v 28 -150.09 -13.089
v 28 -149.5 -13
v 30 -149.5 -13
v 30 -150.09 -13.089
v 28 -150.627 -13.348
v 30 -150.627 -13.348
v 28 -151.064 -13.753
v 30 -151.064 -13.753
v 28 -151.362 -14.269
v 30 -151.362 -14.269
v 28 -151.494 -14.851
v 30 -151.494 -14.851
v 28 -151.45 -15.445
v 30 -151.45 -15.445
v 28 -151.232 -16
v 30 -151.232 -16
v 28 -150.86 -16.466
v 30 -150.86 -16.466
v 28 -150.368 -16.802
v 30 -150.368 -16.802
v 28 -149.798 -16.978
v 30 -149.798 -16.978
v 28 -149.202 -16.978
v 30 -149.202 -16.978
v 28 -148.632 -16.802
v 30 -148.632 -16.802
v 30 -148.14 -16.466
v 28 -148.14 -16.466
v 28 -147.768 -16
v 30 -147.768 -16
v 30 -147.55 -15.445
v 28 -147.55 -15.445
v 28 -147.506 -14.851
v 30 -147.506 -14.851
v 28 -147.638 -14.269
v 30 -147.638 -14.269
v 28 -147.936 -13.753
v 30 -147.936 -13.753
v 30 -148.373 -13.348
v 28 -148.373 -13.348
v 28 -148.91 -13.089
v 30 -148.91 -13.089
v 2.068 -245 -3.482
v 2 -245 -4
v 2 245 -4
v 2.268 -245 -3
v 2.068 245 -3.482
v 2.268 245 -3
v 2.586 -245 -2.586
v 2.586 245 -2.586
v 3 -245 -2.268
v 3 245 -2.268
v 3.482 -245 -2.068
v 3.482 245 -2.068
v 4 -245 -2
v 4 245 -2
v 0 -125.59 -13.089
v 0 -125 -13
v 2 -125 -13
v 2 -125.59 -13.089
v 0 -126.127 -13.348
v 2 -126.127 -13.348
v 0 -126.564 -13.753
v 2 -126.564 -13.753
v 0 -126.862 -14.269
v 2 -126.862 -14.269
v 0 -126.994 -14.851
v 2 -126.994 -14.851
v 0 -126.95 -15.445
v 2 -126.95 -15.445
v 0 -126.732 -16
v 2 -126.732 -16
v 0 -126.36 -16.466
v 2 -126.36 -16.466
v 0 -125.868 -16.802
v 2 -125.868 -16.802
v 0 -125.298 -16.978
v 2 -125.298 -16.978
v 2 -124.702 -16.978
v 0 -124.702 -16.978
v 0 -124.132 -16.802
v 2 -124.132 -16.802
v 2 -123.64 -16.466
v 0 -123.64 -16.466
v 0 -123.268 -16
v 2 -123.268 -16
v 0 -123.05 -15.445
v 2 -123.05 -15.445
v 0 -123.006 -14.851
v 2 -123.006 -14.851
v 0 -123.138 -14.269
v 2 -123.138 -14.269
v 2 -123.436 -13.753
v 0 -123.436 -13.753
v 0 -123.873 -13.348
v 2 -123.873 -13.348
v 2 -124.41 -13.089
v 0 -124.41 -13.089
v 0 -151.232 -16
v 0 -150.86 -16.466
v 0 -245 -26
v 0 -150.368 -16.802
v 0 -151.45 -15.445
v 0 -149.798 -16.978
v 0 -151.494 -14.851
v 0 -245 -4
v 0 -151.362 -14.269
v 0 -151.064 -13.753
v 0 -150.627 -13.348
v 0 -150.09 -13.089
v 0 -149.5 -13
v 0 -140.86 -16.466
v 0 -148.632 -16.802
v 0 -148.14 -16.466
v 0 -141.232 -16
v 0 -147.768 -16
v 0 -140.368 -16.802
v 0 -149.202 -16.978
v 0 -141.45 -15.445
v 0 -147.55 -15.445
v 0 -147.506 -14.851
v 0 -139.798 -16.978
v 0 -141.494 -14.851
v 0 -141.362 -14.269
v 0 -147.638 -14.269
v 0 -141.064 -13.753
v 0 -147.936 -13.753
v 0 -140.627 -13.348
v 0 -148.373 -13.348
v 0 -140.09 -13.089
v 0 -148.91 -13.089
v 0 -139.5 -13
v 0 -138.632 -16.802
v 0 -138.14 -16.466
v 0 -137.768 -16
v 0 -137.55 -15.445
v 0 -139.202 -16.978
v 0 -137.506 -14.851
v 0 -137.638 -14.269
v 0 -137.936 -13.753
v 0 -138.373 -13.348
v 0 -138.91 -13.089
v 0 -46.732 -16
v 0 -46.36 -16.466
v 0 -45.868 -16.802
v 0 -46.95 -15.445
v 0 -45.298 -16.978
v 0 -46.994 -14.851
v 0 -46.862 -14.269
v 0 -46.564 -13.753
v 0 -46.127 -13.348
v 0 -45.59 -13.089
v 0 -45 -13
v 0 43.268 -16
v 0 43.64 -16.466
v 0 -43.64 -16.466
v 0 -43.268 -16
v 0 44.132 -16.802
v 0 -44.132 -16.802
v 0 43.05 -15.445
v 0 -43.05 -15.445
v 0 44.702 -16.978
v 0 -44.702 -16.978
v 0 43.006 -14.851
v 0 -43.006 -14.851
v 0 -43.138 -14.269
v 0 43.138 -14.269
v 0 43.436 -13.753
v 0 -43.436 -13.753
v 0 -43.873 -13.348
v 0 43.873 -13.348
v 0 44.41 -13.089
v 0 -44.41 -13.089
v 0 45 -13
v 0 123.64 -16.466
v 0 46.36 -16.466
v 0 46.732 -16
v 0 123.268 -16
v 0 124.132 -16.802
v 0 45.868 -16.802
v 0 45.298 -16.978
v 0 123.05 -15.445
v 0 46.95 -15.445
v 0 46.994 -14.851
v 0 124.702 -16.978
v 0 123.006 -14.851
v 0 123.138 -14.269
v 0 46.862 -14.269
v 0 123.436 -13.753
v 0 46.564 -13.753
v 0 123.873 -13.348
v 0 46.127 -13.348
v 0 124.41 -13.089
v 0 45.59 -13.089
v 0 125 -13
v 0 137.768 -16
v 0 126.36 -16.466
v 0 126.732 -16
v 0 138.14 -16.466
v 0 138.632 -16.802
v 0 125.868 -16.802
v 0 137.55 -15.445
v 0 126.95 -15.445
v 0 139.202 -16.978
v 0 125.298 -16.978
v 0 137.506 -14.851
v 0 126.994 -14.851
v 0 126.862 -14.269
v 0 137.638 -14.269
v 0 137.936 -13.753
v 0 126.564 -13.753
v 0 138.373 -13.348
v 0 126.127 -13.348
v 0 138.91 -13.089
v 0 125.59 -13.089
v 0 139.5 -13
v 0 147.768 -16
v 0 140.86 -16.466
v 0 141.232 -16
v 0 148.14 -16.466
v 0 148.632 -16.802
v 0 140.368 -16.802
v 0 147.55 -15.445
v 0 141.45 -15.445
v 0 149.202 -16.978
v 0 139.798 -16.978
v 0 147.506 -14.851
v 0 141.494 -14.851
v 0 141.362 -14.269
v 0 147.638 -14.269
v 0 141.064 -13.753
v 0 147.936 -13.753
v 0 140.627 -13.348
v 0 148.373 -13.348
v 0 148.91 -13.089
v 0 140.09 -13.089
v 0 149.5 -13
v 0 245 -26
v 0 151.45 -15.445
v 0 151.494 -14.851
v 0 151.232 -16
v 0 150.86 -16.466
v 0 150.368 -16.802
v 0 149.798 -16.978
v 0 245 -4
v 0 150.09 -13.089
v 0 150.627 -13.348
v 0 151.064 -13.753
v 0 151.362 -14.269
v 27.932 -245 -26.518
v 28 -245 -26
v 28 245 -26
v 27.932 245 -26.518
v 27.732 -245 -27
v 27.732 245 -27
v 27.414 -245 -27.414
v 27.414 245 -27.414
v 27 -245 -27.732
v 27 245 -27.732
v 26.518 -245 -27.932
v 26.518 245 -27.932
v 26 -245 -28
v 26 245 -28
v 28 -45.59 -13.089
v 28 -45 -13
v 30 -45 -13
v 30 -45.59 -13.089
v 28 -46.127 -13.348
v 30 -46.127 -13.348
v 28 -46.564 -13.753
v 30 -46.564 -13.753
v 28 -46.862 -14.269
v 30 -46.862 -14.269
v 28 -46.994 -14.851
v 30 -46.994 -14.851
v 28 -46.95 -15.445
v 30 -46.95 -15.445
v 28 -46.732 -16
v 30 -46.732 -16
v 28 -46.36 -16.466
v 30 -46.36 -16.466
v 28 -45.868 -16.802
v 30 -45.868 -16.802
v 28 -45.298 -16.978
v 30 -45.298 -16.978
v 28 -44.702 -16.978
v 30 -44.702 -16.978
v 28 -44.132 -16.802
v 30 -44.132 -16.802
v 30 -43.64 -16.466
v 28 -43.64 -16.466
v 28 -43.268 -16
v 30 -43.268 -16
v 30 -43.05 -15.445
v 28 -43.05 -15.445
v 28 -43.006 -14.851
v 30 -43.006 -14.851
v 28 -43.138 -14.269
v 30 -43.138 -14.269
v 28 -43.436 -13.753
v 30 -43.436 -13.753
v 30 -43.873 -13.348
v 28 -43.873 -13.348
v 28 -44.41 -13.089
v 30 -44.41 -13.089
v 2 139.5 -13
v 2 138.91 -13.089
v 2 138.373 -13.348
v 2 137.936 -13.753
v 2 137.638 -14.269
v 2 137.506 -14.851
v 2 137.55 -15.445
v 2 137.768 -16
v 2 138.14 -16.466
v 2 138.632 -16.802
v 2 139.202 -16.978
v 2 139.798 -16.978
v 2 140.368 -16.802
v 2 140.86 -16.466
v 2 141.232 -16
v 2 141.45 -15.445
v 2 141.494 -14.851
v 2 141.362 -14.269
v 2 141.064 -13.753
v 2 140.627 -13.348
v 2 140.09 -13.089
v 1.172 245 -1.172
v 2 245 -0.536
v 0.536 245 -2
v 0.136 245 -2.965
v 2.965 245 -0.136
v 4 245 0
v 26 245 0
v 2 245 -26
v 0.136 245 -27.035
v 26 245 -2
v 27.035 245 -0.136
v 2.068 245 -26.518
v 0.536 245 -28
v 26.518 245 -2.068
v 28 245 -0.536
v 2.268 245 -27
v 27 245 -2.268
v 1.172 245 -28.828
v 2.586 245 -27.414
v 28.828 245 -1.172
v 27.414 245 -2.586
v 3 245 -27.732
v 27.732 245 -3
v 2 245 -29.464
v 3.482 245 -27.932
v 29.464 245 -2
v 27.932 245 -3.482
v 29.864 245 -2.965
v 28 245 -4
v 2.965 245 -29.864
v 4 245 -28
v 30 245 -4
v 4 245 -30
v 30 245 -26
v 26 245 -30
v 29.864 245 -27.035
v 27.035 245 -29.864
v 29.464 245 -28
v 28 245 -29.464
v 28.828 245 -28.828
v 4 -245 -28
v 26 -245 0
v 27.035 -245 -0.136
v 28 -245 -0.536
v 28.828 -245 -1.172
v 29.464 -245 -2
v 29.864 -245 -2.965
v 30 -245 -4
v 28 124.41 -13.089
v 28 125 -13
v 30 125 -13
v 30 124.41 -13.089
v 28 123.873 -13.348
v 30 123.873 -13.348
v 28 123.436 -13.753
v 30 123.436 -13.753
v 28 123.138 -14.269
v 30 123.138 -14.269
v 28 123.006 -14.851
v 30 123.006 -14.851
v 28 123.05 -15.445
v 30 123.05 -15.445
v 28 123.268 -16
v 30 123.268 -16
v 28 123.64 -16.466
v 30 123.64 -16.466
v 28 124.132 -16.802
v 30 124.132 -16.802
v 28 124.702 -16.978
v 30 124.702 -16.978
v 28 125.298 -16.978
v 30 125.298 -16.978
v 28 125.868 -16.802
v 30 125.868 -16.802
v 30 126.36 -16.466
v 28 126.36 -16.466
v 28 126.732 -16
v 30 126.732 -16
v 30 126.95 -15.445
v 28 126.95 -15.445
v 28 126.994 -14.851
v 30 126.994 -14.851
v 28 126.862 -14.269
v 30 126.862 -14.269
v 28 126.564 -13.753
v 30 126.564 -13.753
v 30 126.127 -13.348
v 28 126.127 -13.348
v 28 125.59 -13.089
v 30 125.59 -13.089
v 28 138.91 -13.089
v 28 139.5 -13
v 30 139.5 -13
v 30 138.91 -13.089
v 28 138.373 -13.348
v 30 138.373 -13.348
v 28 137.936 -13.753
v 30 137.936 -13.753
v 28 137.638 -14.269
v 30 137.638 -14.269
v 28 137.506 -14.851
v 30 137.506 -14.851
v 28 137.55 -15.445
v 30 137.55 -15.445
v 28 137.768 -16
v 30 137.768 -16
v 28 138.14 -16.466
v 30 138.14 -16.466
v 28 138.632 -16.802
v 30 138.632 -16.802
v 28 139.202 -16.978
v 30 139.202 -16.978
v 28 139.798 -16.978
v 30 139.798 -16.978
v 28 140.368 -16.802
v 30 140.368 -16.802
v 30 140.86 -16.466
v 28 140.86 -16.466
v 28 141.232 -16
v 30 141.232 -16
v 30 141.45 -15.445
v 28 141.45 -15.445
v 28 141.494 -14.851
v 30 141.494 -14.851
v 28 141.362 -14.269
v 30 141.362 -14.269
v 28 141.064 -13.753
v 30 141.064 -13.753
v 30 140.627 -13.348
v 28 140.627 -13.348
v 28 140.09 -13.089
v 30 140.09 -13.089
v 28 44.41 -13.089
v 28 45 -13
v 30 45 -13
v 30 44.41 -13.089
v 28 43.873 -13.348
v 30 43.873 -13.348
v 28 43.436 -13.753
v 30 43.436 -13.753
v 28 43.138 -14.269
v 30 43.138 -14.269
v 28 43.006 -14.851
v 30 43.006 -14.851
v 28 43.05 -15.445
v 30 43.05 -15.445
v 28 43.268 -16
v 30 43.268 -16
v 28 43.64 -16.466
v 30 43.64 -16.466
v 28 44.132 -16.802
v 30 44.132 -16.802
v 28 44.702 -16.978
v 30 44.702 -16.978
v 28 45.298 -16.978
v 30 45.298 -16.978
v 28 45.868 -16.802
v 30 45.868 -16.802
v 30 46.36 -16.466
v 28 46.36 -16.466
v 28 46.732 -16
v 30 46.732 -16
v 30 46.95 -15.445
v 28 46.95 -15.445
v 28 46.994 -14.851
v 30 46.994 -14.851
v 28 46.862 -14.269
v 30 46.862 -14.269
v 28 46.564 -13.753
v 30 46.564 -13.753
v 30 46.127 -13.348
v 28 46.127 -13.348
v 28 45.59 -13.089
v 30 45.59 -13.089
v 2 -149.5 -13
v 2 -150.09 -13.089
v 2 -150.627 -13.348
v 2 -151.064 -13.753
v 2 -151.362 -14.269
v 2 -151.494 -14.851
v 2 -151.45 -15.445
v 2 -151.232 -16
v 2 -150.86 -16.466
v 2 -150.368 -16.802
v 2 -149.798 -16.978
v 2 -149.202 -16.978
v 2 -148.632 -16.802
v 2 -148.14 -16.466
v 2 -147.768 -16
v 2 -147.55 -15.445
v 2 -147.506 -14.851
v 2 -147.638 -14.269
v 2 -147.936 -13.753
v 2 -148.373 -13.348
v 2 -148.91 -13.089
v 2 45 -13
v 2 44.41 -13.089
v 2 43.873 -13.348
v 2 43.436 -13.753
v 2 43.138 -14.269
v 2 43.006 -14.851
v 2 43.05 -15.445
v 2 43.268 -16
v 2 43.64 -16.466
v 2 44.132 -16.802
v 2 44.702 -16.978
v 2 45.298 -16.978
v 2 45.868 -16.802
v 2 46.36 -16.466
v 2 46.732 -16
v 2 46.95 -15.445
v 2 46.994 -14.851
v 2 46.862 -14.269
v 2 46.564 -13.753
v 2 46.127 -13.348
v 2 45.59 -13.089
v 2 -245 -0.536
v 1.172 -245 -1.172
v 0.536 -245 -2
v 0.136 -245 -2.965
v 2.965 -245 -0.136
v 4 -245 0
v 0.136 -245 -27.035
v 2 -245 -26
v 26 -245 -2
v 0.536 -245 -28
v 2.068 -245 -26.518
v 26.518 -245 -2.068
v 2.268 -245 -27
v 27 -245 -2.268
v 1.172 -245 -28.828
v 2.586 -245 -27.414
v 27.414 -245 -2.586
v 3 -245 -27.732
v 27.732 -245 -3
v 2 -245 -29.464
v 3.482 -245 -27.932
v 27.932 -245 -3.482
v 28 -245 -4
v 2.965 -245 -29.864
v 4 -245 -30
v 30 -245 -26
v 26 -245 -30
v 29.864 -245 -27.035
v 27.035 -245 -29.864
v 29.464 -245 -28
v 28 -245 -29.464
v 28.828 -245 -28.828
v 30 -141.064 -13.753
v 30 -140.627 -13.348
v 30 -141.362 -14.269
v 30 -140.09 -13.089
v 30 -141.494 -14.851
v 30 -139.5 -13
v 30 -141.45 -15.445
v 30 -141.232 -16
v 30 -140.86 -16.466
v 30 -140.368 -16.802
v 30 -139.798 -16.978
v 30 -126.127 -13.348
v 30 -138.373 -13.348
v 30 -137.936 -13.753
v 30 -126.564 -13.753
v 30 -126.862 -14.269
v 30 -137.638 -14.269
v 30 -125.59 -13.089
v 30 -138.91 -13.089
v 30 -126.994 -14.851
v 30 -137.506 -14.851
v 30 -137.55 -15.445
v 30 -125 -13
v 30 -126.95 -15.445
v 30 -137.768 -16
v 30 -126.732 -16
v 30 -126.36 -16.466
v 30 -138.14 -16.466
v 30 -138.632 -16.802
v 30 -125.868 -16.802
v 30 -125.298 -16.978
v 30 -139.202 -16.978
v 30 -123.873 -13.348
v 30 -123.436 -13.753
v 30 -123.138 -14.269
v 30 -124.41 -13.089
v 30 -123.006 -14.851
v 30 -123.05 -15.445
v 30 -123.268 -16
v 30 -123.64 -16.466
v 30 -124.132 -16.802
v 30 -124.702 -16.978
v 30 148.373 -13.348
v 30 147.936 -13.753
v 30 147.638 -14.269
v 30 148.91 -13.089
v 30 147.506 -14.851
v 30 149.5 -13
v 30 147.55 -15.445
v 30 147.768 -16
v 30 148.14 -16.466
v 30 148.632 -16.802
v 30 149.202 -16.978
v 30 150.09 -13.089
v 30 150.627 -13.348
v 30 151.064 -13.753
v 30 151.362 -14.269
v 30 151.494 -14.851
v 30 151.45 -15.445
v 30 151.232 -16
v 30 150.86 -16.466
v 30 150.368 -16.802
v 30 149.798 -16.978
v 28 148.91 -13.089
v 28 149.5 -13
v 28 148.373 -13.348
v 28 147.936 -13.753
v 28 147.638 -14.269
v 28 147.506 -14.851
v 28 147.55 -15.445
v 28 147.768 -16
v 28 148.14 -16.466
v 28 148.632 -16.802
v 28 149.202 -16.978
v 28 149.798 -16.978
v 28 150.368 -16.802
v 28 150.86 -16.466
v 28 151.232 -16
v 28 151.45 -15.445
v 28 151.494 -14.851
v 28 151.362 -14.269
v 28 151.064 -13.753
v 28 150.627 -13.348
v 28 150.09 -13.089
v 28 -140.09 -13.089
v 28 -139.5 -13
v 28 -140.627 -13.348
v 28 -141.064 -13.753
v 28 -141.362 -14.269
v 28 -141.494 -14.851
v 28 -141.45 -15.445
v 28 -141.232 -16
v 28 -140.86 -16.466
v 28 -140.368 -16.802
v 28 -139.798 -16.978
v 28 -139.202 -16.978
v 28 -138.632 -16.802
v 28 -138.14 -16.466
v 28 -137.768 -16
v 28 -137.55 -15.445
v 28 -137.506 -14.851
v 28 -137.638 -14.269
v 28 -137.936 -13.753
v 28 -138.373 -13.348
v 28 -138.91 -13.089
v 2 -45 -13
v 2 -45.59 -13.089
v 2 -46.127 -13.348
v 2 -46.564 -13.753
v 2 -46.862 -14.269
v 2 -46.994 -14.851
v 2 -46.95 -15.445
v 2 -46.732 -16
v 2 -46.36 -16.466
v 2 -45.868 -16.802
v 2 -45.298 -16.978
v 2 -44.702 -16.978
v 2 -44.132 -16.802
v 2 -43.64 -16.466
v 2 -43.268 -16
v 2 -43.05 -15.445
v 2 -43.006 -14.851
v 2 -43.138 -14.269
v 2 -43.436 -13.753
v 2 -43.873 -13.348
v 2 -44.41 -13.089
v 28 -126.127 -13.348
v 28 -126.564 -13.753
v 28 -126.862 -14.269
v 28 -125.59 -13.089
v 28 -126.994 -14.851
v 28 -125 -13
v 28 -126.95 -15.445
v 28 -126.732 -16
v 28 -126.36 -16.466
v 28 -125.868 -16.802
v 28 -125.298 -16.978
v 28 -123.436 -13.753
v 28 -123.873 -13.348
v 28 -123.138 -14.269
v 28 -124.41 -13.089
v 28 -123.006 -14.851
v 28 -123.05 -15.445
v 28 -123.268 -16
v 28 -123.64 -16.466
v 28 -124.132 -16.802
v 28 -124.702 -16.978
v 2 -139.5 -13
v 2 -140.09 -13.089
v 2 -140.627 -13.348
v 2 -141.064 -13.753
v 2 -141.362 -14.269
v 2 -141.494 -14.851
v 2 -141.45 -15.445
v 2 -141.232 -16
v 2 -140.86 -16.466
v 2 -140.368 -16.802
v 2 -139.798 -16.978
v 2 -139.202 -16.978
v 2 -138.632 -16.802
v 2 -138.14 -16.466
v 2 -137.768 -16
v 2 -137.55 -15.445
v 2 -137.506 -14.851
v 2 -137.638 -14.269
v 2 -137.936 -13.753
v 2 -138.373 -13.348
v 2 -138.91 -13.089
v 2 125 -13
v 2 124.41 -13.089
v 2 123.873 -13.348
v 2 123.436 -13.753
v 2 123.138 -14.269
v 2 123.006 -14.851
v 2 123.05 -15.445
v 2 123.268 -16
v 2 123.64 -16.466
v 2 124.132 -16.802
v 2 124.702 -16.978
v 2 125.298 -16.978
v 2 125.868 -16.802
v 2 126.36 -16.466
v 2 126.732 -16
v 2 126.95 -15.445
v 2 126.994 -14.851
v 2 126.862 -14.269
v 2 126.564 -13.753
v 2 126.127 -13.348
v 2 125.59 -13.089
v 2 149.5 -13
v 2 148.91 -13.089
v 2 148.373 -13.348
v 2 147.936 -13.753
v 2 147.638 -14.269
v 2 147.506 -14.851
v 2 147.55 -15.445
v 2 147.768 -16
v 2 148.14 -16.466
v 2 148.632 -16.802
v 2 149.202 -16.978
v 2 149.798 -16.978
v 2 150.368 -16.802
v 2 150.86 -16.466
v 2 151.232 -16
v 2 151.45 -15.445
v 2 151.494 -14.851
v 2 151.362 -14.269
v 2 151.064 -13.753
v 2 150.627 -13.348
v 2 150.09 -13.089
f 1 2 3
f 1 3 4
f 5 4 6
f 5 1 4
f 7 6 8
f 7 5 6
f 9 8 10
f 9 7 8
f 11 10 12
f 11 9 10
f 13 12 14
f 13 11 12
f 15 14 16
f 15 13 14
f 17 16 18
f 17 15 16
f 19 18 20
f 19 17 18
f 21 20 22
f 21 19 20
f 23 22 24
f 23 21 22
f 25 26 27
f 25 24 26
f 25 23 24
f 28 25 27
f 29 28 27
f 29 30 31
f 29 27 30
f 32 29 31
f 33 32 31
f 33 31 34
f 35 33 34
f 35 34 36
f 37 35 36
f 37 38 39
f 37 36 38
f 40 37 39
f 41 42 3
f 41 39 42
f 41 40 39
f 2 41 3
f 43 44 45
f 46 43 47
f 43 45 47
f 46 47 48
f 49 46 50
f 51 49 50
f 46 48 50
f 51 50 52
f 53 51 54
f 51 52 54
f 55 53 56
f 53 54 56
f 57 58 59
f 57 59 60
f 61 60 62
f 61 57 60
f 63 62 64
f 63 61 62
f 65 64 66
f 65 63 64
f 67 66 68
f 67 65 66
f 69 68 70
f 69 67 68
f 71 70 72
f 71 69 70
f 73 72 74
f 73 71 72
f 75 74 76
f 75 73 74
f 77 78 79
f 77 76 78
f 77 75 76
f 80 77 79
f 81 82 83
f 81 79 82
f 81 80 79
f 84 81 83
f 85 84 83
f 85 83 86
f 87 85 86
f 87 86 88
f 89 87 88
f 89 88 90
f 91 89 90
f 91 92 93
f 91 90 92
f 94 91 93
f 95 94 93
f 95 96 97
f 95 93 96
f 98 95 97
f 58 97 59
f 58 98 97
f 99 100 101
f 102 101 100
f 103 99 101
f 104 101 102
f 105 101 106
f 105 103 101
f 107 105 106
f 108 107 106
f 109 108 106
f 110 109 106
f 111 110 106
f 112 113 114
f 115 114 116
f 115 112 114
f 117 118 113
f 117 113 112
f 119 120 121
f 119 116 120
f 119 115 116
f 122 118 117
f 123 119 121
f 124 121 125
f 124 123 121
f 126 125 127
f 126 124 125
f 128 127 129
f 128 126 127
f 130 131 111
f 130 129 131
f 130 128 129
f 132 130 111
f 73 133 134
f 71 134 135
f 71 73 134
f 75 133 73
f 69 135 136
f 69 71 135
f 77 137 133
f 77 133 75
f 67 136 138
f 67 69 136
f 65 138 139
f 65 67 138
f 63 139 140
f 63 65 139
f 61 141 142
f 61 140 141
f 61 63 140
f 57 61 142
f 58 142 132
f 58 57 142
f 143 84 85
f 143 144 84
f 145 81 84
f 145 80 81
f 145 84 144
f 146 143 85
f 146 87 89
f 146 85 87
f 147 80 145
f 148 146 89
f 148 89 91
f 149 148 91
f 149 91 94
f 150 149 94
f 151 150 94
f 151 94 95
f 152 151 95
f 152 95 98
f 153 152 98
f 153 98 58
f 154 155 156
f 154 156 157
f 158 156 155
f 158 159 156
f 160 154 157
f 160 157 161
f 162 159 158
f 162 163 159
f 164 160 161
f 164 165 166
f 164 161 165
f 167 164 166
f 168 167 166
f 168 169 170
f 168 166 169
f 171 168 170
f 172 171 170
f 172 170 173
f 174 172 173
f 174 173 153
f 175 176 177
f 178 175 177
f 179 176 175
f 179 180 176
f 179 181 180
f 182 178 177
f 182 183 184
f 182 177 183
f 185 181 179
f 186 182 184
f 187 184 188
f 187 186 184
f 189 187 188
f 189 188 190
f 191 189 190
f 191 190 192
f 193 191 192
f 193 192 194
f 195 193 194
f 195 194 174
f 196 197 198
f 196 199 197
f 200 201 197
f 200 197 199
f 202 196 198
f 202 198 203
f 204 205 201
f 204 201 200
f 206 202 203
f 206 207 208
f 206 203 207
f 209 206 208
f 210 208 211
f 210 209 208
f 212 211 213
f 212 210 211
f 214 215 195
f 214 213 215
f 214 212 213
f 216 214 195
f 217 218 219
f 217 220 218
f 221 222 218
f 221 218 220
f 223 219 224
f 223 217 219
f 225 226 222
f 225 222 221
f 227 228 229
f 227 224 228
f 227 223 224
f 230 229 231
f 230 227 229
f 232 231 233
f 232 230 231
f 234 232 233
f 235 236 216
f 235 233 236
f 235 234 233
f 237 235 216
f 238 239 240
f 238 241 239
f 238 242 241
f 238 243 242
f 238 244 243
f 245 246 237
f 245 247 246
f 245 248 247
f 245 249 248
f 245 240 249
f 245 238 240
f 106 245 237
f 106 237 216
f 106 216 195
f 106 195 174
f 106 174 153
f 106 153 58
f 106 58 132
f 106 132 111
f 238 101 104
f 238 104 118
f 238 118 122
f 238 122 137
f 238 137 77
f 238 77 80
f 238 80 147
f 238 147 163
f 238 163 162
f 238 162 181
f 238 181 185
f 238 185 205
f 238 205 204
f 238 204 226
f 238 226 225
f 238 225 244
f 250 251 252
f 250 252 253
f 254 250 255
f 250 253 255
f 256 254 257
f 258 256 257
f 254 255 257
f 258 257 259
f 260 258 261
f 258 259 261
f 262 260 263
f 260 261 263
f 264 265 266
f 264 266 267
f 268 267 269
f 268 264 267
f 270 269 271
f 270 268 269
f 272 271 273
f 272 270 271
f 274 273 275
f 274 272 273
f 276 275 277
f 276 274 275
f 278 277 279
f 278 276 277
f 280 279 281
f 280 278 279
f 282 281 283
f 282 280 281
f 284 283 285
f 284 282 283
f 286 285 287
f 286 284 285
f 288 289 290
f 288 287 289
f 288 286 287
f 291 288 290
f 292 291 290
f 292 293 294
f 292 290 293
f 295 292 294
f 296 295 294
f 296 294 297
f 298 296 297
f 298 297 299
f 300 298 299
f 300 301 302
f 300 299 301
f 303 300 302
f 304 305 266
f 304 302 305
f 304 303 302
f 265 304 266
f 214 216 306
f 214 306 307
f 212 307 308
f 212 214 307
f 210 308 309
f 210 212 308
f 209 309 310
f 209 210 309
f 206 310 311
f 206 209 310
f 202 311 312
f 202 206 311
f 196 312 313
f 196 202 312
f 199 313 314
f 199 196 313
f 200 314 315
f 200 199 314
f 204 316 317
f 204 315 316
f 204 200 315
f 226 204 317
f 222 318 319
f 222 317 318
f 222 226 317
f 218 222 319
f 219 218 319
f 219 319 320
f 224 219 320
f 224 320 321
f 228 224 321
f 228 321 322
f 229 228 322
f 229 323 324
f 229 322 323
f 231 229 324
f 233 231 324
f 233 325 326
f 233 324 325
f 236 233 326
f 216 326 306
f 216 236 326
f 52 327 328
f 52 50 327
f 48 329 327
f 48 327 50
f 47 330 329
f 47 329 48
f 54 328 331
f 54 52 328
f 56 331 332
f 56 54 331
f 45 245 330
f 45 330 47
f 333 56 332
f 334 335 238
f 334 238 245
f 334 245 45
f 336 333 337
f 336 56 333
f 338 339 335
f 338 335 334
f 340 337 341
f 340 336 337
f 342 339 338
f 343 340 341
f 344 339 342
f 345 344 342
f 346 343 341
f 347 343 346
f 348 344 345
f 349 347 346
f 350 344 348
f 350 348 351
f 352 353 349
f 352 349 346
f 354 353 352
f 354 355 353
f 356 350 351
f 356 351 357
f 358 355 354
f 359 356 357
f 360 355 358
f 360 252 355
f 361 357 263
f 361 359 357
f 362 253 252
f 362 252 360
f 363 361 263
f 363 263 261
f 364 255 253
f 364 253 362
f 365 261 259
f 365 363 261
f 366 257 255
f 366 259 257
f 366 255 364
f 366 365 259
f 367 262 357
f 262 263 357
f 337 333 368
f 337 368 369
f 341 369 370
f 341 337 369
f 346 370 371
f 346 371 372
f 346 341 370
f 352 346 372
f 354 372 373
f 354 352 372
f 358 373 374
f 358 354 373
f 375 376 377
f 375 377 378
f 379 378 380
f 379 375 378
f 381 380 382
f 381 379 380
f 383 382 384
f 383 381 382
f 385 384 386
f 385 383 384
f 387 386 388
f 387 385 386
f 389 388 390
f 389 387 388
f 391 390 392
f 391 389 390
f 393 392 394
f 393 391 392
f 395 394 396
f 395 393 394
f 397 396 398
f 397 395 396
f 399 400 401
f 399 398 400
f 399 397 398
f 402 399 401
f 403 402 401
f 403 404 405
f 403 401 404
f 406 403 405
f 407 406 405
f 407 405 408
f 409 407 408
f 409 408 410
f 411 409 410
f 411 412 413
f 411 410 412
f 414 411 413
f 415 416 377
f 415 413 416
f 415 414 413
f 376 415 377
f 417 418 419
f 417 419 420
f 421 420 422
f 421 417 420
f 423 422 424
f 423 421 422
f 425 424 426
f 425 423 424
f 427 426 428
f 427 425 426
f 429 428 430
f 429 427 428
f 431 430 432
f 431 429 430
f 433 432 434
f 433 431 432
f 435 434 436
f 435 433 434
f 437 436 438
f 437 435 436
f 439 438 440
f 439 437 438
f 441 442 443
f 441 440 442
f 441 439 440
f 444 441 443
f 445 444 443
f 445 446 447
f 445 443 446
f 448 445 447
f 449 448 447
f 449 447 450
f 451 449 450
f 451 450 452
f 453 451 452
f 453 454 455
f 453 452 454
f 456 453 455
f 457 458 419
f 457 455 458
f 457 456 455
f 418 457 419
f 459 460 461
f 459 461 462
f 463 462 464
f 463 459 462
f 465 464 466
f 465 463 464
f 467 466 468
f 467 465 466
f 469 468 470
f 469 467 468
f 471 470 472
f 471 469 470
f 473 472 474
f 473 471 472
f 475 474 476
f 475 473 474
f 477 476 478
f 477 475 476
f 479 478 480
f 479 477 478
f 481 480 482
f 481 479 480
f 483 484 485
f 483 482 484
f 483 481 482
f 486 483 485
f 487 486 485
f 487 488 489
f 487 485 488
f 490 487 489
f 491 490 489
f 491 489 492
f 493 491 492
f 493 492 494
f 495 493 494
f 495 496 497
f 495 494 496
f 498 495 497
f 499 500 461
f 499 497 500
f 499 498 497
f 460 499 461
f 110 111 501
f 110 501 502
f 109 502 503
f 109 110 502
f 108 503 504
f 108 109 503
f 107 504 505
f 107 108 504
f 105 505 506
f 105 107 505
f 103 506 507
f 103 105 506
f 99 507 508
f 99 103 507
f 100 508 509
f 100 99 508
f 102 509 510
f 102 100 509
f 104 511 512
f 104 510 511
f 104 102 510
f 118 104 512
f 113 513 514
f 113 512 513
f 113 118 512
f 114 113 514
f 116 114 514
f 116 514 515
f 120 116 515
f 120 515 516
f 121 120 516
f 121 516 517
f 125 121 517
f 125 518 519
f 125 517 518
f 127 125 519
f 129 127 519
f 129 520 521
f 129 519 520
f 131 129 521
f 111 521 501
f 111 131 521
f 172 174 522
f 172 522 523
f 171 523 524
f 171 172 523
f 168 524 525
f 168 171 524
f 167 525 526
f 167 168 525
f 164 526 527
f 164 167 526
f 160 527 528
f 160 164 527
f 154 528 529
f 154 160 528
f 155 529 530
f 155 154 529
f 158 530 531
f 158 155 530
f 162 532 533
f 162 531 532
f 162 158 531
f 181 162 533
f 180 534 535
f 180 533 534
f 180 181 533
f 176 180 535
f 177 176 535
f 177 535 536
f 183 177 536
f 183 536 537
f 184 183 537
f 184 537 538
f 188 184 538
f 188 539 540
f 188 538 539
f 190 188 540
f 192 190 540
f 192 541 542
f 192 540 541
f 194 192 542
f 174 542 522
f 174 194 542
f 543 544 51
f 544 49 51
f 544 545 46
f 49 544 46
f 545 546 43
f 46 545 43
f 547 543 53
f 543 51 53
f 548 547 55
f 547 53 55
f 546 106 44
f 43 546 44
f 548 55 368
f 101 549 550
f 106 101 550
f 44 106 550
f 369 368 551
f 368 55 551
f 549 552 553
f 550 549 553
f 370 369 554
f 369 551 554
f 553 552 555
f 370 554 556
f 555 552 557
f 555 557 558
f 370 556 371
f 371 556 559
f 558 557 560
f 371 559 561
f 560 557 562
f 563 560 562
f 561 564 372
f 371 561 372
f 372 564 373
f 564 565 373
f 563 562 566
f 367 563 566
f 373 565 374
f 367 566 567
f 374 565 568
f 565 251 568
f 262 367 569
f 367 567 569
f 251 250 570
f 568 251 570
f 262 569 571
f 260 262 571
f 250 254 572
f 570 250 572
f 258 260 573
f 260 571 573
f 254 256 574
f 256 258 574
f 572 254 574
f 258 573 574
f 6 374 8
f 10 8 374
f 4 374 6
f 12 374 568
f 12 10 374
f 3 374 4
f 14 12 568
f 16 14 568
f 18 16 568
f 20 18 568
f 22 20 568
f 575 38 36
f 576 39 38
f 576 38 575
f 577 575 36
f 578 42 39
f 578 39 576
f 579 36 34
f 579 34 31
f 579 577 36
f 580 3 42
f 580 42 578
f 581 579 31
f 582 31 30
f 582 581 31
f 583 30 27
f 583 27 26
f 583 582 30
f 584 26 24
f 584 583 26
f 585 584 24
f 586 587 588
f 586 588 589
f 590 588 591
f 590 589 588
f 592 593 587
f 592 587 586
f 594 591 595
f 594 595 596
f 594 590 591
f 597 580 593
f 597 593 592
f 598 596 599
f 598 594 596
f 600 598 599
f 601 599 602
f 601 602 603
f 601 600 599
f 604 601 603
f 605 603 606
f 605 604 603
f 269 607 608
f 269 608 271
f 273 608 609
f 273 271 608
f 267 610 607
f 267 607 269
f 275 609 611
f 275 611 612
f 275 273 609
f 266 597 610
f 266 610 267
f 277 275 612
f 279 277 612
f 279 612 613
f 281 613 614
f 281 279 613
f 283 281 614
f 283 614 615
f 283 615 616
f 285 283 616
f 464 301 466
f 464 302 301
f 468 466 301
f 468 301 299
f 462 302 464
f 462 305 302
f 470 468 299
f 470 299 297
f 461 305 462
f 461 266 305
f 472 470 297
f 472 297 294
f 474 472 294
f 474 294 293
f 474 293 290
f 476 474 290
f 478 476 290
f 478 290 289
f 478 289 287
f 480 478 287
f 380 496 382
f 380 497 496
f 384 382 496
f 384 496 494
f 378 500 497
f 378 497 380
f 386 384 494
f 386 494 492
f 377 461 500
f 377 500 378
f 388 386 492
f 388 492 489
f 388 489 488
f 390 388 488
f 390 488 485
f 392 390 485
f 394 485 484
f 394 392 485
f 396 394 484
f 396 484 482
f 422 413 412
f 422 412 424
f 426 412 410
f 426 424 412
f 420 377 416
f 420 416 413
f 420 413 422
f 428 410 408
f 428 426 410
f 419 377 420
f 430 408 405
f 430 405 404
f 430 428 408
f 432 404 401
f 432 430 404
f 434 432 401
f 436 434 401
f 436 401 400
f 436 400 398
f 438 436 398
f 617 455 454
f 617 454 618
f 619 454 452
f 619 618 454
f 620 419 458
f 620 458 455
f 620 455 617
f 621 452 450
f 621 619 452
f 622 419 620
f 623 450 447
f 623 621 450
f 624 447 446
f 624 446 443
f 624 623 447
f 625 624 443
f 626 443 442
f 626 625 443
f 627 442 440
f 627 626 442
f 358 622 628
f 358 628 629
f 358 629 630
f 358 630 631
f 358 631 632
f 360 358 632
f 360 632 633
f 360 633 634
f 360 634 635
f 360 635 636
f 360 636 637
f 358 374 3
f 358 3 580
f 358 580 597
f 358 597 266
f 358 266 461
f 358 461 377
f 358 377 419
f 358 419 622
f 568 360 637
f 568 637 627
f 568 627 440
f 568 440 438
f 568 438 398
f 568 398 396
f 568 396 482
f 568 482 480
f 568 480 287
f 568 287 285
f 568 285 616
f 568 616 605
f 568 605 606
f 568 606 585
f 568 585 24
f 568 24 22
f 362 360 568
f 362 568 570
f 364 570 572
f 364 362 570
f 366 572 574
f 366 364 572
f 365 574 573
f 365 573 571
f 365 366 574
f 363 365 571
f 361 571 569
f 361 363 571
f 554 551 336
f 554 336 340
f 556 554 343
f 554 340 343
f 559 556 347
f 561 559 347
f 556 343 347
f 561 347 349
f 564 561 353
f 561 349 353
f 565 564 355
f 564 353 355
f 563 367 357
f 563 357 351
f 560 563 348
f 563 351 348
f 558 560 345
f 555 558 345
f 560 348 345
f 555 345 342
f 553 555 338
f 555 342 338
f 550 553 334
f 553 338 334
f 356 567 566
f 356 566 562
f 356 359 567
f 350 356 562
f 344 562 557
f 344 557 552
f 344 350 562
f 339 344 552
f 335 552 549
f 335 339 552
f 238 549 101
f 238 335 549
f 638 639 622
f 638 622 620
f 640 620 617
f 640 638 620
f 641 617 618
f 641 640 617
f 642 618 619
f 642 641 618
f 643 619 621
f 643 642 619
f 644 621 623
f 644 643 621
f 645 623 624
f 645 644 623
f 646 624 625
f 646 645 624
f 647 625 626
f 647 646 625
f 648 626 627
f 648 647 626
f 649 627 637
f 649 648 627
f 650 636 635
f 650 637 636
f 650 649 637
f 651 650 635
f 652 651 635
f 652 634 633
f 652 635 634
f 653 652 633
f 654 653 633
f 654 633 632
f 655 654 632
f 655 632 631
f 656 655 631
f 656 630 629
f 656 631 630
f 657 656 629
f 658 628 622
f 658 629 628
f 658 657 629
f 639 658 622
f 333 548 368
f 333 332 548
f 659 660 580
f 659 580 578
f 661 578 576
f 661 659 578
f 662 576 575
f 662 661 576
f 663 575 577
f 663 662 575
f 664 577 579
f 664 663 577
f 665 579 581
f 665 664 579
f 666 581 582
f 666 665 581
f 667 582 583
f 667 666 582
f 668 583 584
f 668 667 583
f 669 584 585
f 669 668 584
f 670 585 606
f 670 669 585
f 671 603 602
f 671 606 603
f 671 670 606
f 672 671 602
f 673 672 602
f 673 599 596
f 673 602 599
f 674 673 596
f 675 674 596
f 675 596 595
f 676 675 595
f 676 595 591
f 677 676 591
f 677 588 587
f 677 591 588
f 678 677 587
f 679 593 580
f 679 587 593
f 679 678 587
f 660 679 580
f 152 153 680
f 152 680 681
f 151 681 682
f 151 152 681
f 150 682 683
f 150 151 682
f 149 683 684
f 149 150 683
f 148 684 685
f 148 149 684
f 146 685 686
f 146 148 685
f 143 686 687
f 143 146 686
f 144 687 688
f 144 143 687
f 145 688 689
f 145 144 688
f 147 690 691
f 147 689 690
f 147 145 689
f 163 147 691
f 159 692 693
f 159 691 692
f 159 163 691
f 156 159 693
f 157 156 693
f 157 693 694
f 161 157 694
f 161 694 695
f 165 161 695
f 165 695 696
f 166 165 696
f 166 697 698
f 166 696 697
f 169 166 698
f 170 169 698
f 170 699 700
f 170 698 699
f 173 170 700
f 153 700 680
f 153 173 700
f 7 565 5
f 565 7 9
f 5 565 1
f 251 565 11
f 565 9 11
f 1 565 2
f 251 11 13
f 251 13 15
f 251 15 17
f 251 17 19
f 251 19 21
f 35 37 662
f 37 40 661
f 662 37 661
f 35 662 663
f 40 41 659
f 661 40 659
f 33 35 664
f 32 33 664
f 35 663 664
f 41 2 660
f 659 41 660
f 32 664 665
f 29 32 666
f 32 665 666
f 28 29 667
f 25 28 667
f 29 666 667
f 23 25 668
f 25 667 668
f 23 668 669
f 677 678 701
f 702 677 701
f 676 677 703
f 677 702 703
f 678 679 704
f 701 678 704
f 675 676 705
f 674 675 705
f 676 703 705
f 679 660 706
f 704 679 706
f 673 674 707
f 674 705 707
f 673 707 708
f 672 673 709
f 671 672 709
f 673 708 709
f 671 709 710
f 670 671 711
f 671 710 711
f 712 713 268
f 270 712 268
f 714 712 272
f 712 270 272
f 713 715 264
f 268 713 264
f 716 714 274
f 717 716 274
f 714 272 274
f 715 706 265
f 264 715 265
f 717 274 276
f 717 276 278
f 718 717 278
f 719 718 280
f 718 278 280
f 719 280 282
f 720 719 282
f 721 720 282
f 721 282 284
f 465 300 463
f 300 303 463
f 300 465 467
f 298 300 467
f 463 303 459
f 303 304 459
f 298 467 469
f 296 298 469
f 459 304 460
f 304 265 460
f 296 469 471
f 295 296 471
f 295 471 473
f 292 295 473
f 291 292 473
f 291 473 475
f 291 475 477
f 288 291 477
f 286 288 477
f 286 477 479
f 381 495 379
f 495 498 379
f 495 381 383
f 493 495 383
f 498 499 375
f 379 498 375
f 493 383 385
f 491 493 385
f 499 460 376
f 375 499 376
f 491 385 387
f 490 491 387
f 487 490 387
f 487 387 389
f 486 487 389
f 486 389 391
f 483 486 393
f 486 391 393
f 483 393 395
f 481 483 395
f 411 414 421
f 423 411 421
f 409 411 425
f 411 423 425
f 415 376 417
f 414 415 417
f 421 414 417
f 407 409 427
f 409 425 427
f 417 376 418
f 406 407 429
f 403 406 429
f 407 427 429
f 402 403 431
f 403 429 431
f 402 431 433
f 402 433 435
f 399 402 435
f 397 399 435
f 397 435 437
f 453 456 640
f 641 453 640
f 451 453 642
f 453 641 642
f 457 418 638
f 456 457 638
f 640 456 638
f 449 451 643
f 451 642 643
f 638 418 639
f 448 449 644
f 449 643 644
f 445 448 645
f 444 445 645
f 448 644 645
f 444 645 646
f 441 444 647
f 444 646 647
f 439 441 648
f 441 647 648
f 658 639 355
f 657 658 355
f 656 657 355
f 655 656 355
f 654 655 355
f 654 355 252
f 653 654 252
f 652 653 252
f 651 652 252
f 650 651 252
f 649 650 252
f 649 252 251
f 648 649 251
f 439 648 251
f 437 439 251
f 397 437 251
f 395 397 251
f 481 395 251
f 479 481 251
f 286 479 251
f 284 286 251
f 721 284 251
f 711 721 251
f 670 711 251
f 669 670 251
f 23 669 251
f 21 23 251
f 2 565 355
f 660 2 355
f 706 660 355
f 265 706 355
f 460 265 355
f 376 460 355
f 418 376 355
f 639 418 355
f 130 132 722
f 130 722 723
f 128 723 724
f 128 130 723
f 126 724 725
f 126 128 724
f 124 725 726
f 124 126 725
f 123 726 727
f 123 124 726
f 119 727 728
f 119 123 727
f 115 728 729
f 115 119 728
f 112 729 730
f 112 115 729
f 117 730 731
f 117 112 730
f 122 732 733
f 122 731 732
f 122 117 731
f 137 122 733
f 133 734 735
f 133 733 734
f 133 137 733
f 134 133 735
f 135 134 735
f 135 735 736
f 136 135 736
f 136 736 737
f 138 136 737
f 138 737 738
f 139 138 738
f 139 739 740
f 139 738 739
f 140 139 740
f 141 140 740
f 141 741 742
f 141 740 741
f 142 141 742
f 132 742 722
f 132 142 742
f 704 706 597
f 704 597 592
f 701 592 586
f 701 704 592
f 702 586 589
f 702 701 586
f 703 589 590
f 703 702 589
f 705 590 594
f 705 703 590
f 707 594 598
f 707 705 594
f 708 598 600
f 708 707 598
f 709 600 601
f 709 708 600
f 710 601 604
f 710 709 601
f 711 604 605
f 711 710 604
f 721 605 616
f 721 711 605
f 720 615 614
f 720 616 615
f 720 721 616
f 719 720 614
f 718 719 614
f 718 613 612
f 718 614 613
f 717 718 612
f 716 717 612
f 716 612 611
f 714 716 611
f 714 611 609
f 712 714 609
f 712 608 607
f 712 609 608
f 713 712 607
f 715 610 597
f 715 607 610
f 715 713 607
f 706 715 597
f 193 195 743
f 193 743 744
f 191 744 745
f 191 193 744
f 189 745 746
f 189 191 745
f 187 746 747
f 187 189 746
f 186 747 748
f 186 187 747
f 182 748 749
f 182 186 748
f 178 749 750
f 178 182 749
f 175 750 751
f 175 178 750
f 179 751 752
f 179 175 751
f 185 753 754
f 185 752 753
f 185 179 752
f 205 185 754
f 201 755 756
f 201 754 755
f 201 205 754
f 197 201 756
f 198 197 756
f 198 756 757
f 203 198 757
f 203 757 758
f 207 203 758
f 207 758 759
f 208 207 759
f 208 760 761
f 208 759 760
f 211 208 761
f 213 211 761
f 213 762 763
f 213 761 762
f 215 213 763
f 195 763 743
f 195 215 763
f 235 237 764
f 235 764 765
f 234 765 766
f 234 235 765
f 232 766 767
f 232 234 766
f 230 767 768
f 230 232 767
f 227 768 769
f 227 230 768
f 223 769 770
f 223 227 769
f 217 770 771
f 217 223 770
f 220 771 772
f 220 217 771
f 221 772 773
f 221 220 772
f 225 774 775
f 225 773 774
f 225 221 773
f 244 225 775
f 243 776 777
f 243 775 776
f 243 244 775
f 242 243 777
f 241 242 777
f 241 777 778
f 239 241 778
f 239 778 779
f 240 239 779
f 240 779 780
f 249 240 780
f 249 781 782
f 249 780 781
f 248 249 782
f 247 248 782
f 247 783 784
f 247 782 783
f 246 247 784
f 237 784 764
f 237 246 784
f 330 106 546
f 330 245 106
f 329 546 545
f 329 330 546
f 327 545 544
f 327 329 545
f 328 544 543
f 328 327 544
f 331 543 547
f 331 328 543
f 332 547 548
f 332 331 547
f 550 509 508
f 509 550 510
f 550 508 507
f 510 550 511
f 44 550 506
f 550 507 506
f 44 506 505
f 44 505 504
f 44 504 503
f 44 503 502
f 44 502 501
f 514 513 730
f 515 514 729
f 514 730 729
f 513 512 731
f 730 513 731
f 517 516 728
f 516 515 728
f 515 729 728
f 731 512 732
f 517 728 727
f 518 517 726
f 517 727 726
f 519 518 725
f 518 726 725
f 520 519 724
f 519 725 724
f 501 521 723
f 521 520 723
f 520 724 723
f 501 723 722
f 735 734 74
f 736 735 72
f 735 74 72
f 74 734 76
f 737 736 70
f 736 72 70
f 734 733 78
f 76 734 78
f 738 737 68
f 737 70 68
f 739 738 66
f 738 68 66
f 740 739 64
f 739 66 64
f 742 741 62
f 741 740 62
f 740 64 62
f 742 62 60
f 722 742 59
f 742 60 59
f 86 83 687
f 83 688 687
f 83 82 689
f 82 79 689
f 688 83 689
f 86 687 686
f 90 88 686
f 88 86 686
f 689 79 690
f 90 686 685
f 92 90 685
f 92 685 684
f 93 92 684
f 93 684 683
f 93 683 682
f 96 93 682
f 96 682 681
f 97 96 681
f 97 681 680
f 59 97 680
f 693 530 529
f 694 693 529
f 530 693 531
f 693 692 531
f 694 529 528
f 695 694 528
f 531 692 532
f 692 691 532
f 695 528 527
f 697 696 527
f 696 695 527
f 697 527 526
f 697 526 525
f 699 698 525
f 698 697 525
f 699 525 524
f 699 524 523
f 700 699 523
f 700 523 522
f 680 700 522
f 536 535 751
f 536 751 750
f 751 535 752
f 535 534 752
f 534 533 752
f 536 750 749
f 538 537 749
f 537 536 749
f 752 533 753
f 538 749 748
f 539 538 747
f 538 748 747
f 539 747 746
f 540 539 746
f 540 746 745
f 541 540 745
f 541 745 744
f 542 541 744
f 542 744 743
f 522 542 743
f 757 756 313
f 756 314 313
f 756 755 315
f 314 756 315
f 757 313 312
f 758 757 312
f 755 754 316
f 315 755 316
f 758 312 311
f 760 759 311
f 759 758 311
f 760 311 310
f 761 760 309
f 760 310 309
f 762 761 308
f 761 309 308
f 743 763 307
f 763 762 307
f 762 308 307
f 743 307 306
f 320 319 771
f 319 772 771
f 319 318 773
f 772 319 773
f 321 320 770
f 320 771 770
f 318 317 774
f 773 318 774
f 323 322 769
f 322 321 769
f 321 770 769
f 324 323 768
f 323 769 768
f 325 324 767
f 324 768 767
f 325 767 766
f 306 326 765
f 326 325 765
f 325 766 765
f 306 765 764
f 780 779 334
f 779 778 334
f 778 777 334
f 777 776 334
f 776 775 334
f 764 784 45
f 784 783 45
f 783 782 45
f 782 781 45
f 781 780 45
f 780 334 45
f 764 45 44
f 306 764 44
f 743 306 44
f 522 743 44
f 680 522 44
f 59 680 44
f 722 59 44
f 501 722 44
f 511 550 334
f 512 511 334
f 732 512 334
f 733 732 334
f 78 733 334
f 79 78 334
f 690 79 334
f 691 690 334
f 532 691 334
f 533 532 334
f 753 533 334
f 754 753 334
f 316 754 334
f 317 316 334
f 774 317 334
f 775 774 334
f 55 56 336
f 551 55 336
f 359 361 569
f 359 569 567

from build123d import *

# Parameters (mm, degrees)
EXTRUDE_1_DEPTH          = 245
CUT_EXTRUDE_2_DEPTH      = 249.646335183
CUT_EXTRUDE_2_DEPTH_BACK = 249.646335183
SKETCH_3_R               = 2


with BuildPart() as part:
    # 草图1 → 凸台-拉伸1 (new, symmetric)
    with BuildSketch(Plane(origin=(0, 0, 0), x_dir=(1, 0, 0), z_dir=(0, 1, 0))):
        with BuildLine():
            Line((4, 0), (26, 0))
            ThreePointArc((26, 0), (28.828427125, 1.171572875), (30, 4))
            Line((30, 4), (30, 26))
            ThreePointArc((30, 26), (28.828427125, 28.828427125), (26, 30))
            Line((26, 30), (4, 30))
            ThreePointArc((4, 30), (1.171572875, 28.828427125), (0, 26))
            Line((0, 26), (0, 4))
            ThreePointArc((0, 4), (1.171572875, 1.171572875), (4, 0))
        make_face()
        with BuildLine():
            Line((4, 2), (26, 2))
            ThreePointArc((26, 2), (27.414213562, 2.585786438), (28, 4))
            Line((28, 4), (28, 26))
            ThreePointArc((28, 26), (27.414213562, 27.414213562), (26, 28))
            Line((26, 28), (4, 28))
            ThreePointArc((4, 28), (2.585786438, 27.414213562), (2, 26))
            Line((2, 26), (2, 4))
            ThreePointArc((2, 4), (2.585786438, 2.585786438), (4, 2))
        make_face(mode=Mode.SUBTRACT)
    extrude(amount=EXTRUDE_1_DEPTH, both=True)

    # 草图3 → 切除-拉伸2 (cut, two sides: drawn at the far end of the back side and taken through both)
    with BuildSketch(Plane(origin=(0, 0, 0), x_dir=(0, 0, -1), z_dir=(1, 0, 0)).offset(-CUT_EXTRUDE_2_DEPTH_BACK)):
        with Locations(Location((15, -149.5, 0), (0, 0, 180))):
            Circle(SKETCH_3_R)
        with Locations(Location((15, -139.5, 0), (0, 0, 180))):
            Circle(SKETCH_3_R)
        with Locations(Location((15, 139.5, 0), (0, 0, 180))):
            Circle(SKETCH_3_R)
        with Locations(Location((15, 149.5, 0), (0, 0, 180))):
            Circle(SKETCH_3_R)
        with Locations(Location((15, 125, 0), (0, 0, 180))):
            Circle(SKETCH_3_R)
        with Locations(Location((15, 45, 0), (0, 0, 180))):
            Circle(SKETCH_3_R)
        with Locations(Location((15, -45, 0), (0, 0, 180))):
            Circle(SKETCH_3_R)
        with Locations(Location((15, -125, 0), (0, 0, 180))):
            Circle(SKETCH_3_R)
    extrude(amount=CUT_EXTRUDE_2_DEPTH + CUT_EXTRUDE_2_DEPTH_BACK, mode=Mode.SUBTRACT)


solid = part.part
